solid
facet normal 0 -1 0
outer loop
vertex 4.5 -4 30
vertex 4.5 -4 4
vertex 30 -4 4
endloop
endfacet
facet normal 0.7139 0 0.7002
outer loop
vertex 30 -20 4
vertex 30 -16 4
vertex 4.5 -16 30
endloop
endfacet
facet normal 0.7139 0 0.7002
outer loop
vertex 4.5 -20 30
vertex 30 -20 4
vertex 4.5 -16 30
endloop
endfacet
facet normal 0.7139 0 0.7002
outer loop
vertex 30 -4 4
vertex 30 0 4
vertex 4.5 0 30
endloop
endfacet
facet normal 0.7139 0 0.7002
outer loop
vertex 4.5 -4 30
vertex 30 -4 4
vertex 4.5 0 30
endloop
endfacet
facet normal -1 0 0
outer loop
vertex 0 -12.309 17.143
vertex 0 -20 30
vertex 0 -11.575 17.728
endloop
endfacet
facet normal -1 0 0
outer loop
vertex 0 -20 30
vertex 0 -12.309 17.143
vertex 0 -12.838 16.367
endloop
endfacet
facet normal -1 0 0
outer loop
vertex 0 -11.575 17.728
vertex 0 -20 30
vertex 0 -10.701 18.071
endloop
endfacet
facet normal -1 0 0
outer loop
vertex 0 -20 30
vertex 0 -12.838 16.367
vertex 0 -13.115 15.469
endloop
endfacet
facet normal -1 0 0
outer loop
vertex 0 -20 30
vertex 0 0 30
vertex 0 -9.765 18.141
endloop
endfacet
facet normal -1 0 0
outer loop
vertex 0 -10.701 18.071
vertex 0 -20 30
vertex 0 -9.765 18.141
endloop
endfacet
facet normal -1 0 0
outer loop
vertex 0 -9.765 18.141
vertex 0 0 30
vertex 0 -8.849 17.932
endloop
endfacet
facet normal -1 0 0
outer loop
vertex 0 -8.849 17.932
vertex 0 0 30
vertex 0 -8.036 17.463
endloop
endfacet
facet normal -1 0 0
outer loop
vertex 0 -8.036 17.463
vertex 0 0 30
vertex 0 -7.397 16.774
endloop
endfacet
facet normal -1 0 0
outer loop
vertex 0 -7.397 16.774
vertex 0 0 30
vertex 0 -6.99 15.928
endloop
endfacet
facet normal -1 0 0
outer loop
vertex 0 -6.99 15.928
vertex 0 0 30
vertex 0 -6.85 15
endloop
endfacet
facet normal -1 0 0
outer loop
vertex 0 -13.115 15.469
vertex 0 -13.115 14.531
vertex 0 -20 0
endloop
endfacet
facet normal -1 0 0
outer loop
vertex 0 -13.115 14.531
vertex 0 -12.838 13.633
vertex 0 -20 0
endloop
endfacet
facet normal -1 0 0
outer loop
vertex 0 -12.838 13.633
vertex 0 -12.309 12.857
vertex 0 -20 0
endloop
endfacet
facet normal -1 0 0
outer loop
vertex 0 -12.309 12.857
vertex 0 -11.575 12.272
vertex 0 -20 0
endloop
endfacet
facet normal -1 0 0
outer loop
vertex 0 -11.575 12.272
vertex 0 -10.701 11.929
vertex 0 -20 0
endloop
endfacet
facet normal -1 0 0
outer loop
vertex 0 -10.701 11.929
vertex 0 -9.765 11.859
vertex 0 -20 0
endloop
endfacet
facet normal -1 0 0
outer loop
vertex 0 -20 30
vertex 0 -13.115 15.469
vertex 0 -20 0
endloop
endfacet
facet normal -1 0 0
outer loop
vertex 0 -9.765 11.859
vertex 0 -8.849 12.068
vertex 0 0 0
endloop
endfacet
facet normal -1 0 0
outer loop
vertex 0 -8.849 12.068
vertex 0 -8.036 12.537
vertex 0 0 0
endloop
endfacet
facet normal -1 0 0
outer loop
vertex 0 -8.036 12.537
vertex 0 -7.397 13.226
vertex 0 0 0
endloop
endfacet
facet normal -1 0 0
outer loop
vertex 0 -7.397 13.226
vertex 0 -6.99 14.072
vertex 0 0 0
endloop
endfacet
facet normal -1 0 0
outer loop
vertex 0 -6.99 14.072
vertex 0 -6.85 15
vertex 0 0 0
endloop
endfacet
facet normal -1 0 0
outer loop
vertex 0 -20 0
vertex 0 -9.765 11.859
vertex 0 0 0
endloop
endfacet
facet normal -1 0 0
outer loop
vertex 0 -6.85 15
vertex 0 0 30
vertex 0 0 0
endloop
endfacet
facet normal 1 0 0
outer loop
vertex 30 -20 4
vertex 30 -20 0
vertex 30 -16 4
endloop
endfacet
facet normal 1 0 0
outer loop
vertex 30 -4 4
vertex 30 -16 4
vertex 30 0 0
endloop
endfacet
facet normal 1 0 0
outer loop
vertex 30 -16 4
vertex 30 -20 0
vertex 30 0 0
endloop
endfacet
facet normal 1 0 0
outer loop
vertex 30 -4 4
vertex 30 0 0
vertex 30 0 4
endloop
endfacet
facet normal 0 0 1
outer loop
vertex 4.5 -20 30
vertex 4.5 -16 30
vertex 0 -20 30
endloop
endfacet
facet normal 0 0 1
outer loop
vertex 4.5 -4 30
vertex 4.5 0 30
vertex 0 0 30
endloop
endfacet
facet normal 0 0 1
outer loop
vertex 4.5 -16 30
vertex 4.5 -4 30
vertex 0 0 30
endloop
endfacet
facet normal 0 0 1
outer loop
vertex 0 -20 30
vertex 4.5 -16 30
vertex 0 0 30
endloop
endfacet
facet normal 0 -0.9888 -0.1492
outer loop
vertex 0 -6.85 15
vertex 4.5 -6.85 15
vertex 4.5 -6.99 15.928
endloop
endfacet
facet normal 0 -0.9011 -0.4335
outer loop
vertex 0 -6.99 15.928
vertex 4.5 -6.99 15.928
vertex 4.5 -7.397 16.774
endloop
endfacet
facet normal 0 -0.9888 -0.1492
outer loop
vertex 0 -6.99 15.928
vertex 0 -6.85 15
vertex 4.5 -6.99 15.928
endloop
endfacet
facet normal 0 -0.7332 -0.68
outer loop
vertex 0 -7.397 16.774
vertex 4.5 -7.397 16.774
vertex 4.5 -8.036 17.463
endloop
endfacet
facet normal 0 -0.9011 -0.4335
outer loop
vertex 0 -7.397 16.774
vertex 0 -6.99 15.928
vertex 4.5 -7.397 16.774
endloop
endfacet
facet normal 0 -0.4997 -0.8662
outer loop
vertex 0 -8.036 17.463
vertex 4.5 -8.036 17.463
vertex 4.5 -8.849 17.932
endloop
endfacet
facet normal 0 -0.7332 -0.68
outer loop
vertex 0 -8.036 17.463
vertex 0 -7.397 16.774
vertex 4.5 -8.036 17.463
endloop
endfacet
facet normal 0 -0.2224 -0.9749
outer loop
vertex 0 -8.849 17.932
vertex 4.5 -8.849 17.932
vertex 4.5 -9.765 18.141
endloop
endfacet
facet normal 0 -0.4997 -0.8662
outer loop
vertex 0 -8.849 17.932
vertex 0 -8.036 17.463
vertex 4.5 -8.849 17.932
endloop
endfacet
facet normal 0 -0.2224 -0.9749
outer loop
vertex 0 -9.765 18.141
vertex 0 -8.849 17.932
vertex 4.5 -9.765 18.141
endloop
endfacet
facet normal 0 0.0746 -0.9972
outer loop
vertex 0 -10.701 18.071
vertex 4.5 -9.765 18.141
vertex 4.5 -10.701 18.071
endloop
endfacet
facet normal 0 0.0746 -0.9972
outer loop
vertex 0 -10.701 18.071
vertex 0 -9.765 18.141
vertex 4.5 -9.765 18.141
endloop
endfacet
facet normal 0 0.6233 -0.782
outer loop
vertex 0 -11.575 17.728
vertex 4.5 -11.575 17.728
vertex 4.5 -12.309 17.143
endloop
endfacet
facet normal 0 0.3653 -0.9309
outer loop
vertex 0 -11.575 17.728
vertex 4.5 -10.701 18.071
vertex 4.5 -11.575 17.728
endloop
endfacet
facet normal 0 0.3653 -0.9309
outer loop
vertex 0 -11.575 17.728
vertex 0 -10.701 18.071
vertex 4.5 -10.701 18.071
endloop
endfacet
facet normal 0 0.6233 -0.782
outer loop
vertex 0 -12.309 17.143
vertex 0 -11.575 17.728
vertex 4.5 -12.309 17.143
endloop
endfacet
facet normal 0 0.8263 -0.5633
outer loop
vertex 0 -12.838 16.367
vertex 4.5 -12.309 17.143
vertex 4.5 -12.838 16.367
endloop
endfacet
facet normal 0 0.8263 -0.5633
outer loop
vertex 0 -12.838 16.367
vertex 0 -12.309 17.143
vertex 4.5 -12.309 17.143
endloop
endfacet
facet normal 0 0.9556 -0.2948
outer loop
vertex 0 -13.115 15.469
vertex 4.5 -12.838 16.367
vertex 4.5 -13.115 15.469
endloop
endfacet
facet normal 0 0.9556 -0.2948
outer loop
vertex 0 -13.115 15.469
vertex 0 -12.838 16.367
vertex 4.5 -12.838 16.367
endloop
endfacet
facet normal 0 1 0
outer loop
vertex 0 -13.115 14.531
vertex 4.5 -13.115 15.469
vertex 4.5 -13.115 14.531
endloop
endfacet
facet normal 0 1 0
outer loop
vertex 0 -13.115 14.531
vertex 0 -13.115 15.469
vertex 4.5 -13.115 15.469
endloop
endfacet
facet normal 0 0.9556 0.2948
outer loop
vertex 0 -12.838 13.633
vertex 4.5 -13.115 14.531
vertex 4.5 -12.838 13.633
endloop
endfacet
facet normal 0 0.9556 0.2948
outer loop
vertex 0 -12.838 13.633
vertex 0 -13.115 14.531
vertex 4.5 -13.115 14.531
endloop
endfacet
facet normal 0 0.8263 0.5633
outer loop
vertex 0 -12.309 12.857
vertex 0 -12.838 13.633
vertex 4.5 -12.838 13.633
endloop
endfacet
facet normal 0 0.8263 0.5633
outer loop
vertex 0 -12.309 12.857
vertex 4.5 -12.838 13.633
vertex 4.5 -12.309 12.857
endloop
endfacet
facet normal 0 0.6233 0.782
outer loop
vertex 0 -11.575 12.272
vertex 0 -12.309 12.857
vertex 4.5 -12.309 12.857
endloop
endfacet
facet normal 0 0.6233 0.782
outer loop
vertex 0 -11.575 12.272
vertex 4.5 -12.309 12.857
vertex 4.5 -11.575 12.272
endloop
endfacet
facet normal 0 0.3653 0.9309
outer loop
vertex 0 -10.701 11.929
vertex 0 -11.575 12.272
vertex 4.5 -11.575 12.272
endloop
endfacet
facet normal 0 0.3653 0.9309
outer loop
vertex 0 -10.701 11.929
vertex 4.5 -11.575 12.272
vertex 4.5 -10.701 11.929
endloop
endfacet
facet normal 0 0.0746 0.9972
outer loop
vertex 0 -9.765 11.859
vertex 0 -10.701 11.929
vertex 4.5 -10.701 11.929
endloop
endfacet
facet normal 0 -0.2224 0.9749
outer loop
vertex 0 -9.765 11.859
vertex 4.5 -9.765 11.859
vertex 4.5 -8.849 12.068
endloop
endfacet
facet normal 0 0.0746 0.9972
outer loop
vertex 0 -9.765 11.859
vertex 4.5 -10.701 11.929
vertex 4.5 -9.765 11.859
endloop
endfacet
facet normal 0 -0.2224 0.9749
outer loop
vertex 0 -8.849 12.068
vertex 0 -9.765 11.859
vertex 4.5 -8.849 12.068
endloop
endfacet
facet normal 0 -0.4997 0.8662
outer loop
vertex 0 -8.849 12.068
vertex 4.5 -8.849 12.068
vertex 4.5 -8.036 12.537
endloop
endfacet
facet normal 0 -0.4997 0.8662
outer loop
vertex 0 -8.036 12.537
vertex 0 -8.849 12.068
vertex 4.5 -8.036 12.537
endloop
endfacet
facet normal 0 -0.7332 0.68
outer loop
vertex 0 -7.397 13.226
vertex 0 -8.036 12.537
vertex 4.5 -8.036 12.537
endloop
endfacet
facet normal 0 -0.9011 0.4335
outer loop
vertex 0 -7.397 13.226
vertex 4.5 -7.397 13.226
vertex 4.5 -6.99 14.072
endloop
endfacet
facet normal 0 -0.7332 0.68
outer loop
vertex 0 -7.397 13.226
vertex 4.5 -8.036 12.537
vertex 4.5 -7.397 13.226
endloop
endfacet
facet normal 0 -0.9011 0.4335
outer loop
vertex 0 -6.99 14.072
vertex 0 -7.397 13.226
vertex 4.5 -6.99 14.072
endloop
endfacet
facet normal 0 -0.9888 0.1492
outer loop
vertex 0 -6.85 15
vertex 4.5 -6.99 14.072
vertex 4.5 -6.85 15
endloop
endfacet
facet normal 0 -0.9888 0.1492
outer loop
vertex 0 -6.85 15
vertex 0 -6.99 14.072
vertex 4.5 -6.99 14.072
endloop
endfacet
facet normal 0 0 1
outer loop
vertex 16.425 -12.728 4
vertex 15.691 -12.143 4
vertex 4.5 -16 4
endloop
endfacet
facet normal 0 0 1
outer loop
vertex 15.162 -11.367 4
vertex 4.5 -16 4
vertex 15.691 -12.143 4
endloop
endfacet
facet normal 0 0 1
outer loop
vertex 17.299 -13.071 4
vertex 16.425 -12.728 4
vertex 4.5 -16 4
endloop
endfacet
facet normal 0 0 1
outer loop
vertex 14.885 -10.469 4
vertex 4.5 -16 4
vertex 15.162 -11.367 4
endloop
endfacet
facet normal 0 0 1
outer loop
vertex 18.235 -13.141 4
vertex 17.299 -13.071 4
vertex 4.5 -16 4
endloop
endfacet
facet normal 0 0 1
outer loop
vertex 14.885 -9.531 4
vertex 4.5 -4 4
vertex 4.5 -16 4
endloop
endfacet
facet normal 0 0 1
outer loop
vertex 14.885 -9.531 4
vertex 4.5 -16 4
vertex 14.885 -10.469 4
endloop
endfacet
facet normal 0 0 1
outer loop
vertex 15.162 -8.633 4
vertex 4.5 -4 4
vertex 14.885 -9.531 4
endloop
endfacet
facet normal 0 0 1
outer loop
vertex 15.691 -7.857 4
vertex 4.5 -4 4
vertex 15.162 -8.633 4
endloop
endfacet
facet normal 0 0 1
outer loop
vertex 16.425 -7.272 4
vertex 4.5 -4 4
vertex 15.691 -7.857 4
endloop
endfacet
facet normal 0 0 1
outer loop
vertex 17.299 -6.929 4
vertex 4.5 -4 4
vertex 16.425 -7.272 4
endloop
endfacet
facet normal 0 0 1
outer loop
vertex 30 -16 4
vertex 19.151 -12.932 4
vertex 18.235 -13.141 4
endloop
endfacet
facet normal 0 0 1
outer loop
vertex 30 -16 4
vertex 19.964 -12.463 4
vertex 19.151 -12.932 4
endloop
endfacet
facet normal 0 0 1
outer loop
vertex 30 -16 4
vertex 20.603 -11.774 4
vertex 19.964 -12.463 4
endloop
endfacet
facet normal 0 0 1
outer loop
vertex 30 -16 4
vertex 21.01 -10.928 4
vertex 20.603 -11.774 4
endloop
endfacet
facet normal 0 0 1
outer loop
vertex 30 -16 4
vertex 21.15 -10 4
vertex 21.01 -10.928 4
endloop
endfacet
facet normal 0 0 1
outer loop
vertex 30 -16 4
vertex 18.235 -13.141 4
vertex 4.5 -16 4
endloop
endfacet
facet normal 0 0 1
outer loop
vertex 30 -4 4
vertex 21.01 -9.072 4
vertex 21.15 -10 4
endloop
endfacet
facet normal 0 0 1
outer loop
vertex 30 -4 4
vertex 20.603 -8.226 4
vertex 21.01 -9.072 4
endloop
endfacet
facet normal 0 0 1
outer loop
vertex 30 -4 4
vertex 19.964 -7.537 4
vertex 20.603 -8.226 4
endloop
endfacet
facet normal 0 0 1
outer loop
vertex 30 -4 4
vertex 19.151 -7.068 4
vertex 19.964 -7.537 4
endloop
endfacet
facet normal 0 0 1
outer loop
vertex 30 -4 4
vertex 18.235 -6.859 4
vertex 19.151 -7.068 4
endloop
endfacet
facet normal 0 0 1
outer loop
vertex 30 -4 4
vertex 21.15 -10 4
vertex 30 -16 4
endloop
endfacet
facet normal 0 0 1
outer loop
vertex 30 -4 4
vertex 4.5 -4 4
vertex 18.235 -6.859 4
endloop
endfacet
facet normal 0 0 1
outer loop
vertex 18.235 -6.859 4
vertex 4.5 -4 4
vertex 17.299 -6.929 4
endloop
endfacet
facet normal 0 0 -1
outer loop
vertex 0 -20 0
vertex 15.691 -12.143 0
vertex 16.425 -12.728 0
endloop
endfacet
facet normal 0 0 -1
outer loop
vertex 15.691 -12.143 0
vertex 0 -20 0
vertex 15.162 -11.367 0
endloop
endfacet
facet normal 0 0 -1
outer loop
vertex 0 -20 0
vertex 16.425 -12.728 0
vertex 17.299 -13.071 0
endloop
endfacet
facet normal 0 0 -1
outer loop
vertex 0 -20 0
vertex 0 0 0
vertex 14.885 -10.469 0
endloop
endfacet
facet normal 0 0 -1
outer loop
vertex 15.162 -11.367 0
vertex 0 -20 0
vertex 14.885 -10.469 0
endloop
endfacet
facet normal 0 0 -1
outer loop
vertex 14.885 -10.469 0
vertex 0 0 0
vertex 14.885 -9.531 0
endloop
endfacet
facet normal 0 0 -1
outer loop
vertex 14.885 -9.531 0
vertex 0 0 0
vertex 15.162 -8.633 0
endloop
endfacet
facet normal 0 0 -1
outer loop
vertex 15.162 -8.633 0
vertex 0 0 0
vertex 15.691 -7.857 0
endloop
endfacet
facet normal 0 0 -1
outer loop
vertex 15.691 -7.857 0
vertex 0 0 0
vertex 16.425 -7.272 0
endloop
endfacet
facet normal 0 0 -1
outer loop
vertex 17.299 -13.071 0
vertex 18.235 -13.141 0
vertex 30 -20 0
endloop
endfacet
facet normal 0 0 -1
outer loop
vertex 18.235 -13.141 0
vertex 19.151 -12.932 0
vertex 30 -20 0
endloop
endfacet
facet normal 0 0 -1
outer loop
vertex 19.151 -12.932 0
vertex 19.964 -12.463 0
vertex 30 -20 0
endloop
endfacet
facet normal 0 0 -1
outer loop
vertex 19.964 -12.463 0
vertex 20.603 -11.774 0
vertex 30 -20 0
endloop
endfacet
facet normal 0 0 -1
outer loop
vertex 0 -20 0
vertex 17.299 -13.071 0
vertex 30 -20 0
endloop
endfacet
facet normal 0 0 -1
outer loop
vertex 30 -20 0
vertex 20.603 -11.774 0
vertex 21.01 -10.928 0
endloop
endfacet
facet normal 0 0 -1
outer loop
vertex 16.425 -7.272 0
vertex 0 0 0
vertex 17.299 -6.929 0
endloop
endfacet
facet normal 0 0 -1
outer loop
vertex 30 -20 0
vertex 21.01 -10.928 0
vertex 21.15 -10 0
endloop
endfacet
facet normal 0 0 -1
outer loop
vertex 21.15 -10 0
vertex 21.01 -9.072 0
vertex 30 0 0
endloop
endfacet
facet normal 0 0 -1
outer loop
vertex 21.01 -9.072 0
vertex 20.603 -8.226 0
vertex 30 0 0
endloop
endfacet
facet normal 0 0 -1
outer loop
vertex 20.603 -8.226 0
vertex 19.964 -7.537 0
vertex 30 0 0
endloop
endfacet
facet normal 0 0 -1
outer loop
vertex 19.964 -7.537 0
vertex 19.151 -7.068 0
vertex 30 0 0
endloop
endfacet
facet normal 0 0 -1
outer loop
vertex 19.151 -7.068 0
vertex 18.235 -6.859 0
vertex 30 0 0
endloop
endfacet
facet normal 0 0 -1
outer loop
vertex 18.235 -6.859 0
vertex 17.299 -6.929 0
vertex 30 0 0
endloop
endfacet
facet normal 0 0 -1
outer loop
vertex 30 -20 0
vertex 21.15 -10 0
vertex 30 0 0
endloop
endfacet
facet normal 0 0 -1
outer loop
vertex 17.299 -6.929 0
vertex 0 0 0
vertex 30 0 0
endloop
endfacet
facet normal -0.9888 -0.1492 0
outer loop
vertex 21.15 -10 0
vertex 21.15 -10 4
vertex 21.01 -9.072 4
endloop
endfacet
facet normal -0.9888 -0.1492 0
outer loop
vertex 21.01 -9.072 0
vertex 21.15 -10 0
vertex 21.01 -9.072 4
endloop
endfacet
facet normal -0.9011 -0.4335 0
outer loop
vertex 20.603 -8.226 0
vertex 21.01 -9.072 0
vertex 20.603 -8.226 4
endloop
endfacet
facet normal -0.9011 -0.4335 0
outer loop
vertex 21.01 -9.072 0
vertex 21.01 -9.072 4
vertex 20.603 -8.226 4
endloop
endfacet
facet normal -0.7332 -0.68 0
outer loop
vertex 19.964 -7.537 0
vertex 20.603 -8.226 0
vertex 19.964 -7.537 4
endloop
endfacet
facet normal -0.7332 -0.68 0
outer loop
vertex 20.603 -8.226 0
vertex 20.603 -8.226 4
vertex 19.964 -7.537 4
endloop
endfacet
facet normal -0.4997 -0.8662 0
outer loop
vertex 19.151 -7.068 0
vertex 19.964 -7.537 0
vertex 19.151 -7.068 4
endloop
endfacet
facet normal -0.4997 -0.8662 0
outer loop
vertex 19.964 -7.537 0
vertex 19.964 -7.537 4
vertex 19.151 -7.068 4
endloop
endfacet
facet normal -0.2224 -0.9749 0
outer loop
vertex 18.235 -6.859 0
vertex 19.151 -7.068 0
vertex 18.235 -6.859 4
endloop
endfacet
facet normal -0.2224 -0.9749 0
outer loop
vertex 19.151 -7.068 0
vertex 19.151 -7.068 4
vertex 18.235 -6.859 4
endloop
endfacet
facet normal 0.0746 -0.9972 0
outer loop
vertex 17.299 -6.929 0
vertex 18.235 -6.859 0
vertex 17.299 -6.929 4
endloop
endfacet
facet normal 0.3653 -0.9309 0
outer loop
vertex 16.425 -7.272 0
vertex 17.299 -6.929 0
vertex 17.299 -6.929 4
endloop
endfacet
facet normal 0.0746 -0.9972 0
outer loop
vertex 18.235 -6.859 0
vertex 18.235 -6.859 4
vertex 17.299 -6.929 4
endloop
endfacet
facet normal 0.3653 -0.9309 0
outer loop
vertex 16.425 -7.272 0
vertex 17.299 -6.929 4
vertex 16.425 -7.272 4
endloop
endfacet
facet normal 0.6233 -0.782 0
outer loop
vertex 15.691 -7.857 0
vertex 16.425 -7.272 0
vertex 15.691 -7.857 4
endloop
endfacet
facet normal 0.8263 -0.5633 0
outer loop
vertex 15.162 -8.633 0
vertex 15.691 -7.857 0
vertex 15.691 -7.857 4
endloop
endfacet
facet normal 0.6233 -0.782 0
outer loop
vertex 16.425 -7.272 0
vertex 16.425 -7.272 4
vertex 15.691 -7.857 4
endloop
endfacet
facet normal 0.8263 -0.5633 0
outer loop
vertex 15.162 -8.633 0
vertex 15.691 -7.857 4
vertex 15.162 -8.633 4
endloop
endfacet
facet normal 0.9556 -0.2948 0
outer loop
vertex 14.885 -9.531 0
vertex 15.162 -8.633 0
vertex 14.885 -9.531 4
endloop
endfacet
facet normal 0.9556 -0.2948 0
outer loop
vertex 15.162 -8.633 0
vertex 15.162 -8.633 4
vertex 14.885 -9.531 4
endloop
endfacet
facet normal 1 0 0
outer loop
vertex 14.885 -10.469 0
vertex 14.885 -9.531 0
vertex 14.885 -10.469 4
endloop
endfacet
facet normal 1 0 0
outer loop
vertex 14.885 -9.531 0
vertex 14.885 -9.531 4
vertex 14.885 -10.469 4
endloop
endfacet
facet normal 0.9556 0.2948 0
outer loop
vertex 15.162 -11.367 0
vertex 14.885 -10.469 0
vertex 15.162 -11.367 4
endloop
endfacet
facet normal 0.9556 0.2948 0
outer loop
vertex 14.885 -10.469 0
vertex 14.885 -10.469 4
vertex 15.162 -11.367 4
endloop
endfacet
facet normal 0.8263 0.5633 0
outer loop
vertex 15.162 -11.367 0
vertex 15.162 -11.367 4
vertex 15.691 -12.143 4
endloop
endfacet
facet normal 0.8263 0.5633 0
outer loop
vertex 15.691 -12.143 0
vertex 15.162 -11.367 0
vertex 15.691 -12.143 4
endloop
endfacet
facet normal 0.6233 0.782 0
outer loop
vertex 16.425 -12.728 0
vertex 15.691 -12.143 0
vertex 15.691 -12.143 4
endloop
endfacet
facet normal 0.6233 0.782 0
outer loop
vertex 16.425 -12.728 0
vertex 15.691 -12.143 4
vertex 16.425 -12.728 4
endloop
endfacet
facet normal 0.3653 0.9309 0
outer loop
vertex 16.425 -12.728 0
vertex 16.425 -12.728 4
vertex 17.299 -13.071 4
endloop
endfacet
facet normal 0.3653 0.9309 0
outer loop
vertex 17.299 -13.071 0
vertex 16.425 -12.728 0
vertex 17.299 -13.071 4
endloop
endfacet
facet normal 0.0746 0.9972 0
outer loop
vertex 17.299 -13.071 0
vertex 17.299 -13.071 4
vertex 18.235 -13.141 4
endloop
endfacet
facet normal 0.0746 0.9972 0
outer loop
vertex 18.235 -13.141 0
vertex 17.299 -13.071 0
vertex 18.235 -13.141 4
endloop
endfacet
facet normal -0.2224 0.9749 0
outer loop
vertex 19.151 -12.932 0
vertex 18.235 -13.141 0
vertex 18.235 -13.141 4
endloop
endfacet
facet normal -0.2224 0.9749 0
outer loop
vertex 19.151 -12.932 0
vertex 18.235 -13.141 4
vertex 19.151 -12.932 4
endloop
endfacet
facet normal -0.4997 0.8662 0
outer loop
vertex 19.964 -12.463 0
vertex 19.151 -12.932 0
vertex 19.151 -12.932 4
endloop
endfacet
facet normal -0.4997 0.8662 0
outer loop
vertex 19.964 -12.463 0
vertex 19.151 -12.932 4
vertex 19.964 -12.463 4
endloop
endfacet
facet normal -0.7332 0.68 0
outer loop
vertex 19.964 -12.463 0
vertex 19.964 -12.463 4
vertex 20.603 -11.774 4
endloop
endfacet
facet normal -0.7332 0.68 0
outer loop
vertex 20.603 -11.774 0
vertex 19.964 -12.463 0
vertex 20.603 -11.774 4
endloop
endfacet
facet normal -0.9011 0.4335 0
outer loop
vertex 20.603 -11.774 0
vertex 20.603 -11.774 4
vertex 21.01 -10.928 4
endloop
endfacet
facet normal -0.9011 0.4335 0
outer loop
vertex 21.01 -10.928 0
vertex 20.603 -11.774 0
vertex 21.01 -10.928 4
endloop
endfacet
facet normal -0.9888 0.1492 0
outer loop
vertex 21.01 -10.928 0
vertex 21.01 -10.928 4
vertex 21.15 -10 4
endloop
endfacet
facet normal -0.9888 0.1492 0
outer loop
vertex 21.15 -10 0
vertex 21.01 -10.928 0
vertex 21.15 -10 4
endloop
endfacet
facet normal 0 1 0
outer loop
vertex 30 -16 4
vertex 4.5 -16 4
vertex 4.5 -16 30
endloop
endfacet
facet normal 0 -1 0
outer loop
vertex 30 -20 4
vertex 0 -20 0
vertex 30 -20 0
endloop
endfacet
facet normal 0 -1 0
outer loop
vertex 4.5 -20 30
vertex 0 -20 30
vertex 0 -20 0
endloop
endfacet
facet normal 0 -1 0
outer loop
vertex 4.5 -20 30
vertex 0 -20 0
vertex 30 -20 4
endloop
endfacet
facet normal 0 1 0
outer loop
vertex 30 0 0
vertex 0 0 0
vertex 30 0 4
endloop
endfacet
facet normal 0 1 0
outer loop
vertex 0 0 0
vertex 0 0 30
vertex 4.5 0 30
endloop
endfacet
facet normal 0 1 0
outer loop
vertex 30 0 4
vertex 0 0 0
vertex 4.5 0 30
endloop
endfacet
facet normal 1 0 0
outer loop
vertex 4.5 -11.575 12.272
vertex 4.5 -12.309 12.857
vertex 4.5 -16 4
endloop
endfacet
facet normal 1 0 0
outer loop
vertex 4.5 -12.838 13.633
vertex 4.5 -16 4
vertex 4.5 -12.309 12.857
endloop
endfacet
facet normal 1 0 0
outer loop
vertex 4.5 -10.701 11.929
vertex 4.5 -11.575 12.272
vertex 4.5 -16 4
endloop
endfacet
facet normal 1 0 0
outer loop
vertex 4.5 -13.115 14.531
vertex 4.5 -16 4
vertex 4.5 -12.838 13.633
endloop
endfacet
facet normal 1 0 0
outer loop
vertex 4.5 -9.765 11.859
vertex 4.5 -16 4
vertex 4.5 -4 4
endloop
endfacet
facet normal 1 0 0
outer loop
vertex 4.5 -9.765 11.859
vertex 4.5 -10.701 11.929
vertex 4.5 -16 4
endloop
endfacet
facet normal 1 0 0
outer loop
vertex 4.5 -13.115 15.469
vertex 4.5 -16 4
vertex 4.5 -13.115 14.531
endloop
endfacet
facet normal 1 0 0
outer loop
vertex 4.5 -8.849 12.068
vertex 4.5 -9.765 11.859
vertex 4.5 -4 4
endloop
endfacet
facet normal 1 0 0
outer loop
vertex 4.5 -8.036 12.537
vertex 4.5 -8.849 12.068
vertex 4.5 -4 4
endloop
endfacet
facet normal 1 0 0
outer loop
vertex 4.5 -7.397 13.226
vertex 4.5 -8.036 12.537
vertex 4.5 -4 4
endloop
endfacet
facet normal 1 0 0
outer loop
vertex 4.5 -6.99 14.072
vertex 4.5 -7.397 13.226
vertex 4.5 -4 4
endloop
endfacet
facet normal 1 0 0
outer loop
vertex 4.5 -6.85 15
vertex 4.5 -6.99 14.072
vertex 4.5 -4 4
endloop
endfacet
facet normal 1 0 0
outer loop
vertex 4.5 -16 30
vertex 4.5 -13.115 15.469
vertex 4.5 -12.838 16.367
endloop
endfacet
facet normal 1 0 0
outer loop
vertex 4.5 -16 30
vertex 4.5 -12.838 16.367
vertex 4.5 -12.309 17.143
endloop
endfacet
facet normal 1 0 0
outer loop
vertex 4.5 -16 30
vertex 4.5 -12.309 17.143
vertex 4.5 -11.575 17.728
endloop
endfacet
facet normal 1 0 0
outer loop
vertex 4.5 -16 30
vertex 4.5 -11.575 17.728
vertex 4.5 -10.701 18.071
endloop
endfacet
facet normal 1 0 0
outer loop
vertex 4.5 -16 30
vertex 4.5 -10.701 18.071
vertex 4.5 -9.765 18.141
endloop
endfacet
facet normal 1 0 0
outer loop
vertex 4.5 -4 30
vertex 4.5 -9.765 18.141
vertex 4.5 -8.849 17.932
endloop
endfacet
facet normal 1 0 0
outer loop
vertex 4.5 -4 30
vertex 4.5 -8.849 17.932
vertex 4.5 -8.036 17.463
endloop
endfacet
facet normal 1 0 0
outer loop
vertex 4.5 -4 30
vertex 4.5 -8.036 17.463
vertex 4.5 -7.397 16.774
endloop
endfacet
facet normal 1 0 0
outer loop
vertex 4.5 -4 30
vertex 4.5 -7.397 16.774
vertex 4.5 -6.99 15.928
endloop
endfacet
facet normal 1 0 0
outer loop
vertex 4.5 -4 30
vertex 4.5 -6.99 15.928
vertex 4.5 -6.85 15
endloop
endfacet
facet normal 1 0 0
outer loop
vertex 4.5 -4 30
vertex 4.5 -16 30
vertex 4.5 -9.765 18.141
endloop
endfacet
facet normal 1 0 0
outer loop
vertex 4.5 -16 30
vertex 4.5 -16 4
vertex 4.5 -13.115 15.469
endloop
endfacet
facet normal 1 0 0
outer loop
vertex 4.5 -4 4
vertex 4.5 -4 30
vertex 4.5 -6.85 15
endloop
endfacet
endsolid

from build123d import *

# Parameters (mm, degrees)
F1_DEPTH = 20
F2_W     = 25.5
F2_H     = 12
F3_DEPTH = 26
F4_R     = 3.15
F5_DEPTH = 25
F6_R     = 3.15
F7_DEPTH = 25


with BuildPart() as f1:
    # F0 (on Front) → F1 (new body)
    with BuildSketch(Plane.XZ):
        Polygon((0, 30), (0, 0), (30, 0), (30, 4), (4.5, 30), align=None)
    extrude(amount=F1_DEPTH)

    # F2 (on face) → F3 (cut)
    with BuildSketch(Plane.XY.offset(30)):
        with Locations((17.25, -10)):
            Rectangle(F2_W, F2_H)
    extrude(amount=-F3_DEPTH, mode=Mode.SUBTRACT)

    # F4 (on Right) → F5 (cut)
    with BuildSketch(Plane.YZ):
        with Locations((-10, 15)):
            Circle(F4_R)
    extrude(amount=F5_DEPTH, mode=Mode.SUBTRACT)

    # F6 (on face) → F7 (cut)
    with BuildSketch(Plane.XY.offset(4)):
        with Locations((18, -10)):
            Circle(F6_R)
    extrude(amount=-F7_DEPTH, mode=Mode.SUBTRACT)


solid = f1.part
